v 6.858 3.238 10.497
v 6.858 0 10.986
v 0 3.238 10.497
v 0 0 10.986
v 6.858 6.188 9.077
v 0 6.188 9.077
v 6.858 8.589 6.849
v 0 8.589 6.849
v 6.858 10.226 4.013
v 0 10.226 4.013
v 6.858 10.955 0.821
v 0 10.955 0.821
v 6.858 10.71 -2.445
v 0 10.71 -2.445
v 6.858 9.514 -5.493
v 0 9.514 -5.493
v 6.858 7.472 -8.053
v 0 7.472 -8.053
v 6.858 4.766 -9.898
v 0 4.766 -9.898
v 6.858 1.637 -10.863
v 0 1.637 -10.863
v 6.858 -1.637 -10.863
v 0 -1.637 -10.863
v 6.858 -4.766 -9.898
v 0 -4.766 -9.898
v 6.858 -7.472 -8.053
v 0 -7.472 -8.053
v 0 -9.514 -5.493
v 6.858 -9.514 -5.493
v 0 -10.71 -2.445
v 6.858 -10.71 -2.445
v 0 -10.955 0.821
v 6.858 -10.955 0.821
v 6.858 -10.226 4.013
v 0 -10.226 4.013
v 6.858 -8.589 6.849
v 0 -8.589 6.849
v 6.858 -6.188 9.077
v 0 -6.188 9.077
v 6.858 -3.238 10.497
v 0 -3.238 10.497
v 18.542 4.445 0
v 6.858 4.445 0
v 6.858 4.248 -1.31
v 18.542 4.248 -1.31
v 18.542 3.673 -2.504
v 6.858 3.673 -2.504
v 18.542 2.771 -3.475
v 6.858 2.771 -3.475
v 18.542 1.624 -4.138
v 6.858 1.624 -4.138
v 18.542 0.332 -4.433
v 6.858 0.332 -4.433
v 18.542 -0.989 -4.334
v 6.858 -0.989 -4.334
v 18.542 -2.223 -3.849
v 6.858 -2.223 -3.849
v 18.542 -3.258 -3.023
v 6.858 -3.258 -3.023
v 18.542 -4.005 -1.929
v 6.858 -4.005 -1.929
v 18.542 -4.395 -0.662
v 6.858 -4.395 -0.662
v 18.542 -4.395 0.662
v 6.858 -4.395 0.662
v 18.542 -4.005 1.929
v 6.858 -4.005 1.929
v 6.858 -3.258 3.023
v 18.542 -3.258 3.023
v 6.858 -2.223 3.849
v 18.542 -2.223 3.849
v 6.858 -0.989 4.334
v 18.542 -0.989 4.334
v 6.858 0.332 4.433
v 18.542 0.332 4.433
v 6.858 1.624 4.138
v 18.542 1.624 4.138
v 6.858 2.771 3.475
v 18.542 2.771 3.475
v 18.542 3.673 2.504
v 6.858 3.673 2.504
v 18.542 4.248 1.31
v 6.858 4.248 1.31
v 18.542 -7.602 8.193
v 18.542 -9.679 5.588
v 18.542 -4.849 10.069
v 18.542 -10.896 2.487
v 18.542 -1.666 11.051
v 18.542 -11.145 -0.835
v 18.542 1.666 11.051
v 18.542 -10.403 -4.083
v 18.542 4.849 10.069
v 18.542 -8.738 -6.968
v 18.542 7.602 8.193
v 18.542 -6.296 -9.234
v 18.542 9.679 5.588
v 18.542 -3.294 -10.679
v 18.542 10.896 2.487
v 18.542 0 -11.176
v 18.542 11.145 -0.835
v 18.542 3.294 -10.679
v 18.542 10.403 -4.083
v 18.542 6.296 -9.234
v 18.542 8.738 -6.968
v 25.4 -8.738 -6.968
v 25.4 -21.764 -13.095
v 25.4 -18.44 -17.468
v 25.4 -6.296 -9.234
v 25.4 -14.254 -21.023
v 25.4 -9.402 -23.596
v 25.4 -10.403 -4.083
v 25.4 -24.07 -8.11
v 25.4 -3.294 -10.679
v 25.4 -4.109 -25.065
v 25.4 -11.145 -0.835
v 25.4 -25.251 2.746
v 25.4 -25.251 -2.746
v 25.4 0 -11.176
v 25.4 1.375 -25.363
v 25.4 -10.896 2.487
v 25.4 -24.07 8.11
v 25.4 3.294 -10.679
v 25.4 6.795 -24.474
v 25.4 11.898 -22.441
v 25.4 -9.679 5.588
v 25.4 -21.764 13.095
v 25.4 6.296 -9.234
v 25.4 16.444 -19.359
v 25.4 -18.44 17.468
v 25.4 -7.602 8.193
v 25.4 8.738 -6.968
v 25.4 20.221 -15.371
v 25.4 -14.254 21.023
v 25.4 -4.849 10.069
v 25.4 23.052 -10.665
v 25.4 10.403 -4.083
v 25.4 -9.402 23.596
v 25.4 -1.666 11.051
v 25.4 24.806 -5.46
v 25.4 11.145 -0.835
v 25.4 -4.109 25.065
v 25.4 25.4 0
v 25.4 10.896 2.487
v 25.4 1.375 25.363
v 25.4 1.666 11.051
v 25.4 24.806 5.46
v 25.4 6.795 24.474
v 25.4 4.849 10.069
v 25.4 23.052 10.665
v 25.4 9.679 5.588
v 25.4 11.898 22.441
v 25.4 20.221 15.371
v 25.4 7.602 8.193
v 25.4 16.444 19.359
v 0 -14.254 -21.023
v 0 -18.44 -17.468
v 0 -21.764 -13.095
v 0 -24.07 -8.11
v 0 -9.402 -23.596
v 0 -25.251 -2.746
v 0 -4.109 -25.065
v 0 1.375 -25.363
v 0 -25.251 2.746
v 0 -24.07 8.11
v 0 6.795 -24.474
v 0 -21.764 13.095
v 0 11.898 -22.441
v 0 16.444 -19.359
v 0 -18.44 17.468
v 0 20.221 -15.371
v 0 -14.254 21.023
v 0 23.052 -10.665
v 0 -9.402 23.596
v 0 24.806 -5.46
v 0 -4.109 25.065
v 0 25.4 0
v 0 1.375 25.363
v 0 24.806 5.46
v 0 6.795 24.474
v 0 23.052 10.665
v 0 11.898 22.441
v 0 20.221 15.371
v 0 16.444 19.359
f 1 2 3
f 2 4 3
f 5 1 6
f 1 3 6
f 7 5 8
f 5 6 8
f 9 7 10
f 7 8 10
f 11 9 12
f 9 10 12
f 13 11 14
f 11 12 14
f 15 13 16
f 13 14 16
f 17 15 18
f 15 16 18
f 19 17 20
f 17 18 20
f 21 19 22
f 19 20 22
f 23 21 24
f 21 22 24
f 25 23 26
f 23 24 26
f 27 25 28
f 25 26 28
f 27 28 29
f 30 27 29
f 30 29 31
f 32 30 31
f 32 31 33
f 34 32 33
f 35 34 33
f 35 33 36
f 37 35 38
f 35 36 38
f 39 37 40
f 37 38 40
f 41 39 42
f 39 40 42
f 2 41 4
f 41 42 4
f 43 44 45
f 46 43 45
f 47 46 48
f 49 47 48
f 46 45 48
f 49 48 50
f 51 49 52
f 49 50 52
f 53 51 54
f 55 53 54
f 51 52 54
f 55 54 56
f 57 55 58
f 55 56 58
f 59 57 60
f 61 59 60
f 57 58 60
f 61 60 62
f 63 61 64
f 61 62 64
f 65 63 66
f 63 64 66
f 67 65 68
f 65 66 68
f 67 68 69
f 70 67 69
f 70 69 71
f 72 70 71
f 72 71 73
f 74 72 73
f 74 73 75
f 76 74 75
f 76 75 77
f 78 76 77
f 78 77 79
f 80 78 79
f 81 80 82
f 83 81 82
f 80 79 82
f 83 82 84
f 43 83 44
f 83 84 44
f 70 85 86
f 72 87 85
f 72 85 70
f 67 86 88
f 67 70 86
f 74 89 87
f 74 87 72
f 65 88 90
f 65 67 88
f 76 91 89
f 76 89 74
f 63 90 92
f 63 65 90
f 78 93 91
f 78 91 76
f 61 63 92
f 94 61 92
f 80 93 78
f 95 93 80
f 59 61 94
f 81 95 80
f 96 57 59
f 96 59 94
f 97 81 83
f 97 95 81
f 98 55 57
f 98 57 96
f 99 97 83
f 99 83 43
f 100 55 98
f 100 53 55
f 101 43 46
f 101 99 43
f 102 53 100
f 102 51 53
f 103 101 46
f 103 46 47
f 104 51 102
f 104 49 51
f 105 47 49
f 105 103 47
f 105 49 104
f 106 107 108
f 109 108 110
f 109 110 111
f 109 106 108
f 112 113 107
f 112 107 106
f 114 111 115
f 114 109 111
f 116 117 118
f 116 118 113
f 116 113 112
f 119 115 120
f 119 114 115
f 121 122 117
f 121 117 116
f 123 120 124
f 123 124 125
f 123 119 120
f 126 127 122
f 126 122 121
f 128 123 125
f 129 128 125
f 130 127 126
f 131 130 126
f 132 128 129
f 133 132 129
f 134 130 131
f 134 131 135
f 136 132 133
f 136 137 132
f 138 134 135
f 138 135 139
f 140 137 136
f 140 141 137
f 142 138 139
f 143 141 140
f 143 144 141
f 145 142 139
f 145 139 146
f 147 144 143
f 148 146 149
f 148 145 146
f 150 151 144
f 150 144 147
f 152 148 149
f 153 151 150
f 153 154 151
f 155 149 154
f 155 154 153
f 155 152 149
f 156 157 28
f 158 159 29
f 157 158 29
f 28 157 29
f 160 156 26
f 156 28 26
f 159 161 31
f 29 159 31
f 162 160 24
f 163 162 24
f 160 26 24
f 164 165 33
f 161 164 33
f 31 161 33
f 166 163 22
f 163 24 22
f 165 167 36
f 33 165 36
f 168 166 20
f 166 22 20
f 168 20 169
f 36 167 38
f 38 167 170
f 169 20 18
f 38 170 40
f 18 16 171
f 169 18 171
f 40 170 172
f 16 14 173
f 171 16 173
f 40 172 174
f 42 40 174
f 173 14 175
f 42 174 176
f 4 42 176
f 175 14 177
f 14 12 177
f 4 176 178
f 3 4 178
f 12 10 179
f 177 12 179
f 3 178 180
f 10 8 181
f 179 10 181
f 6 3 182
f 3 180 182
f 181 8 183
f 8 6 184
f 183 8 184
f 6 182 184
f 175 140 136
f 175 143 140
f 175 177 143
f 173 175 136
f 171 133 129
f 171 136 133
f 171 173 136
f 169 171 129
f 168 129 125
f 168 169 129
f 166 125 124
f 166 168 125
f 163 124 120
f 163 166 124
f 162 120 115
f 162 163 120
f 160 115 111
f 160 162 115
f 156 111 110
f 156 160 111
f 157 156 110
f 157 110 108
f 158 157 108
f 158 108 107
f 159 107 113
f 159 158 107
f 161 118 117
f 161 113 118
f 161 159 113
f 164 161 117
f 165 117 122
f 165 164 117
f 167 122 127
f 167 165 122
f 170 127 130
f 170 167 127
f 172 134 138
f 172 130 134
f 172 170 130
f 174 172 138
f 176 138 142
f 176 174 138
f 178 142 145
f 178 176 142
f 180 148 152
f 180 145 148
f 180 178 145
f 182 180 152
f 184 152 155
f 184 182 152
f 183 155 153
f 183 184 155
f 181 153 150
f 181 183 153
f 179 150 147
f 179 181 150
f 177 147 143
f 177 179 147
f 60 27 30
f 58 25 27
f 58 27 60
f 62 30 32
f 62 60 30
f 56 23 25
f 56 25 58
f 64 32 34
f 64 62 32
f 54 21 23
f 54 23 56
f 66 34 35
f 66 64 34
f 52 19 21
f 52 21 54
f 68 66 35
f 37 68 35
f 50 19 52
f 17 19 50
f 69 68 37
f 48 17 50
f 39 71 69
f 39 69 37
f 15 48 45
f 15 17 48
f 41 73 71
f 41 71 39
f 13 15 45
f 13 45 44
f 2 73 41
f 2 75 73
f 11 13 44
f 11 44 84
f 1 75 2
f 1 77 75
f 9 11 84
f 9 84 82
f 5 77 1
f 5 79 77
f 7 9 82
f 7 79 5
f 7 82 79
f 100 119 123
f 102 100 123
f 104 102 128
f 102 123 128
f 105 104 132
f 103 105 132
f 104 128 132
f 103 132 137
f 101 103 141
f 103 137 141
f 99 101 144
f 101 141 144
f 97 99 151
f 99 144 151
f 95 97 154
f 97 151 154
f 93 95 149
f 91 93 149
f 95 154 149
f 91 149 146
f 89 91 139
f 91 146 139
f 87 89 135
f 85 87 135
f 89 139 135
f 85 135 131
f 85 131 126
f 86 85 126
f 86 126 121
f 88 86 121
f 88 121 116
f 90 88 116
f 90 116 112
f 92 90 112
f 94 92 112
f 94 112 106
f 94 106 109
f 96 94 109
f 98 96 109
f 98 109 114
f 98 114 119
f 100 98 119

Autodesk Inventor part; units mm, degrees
ref_plane "YZ Plane" through (0, 0, 0) normal (1, 0, 0) x (0, 1, 0)
ref_plane "XZ Plane" through (0, 0, 0) normal (0, 1, 0) x (-1, 0, 0)
ref_plane "XY Plane" through (0, 0, 0) normal (0, 0, 1) x (1, 0, 0)
sketch "Sketch1" plane through (0, 0, 0) normal (1, 0, 0) x (0, 1, 0)
  circle A0 centre (0, 0) radius 25.4
  circle A1 centre (0, 0) radius 4.445
  dimension "d3" = 8.89
extrude "Extrusion1" add sketch "Sketch1" along normal blind 25.4
sketch "Sketch2" plane through (0, 0, 0) normal (-1, 0, 0) x (0, 0, 1)
  circle A0 centre (0, 0) radius 10.9855
  dimension "d6" = 21.971
extrude "Extrusion2" cut sketch "Sketch2" against normal blind 6.858
sketch "Sketch3" plane through (25.4, 0, 0) normal (1, 0, 0) x (0, 0, -1)
  circle A0 centre (0, 0) radius 10.9855
  dimension "d9" = 21.971
extrude "Extrusion3" cut sketch "Sketch3" against normal blind 6.858
sketch "Sketch5" plane through (25.4, 0, 0) normal (1, 0, 0) x (0, 0, -1)
  circle A0 centre (0, 0) radius 4.445 projected
  circle A1 centre (0, 0) radius 11.176
  dimension "d48" = 22.352
extrude "Extrusion8" cut sketch "Sketch5" against normal up to surface (6.858 mm away)
properties part number "correct_wheel"
